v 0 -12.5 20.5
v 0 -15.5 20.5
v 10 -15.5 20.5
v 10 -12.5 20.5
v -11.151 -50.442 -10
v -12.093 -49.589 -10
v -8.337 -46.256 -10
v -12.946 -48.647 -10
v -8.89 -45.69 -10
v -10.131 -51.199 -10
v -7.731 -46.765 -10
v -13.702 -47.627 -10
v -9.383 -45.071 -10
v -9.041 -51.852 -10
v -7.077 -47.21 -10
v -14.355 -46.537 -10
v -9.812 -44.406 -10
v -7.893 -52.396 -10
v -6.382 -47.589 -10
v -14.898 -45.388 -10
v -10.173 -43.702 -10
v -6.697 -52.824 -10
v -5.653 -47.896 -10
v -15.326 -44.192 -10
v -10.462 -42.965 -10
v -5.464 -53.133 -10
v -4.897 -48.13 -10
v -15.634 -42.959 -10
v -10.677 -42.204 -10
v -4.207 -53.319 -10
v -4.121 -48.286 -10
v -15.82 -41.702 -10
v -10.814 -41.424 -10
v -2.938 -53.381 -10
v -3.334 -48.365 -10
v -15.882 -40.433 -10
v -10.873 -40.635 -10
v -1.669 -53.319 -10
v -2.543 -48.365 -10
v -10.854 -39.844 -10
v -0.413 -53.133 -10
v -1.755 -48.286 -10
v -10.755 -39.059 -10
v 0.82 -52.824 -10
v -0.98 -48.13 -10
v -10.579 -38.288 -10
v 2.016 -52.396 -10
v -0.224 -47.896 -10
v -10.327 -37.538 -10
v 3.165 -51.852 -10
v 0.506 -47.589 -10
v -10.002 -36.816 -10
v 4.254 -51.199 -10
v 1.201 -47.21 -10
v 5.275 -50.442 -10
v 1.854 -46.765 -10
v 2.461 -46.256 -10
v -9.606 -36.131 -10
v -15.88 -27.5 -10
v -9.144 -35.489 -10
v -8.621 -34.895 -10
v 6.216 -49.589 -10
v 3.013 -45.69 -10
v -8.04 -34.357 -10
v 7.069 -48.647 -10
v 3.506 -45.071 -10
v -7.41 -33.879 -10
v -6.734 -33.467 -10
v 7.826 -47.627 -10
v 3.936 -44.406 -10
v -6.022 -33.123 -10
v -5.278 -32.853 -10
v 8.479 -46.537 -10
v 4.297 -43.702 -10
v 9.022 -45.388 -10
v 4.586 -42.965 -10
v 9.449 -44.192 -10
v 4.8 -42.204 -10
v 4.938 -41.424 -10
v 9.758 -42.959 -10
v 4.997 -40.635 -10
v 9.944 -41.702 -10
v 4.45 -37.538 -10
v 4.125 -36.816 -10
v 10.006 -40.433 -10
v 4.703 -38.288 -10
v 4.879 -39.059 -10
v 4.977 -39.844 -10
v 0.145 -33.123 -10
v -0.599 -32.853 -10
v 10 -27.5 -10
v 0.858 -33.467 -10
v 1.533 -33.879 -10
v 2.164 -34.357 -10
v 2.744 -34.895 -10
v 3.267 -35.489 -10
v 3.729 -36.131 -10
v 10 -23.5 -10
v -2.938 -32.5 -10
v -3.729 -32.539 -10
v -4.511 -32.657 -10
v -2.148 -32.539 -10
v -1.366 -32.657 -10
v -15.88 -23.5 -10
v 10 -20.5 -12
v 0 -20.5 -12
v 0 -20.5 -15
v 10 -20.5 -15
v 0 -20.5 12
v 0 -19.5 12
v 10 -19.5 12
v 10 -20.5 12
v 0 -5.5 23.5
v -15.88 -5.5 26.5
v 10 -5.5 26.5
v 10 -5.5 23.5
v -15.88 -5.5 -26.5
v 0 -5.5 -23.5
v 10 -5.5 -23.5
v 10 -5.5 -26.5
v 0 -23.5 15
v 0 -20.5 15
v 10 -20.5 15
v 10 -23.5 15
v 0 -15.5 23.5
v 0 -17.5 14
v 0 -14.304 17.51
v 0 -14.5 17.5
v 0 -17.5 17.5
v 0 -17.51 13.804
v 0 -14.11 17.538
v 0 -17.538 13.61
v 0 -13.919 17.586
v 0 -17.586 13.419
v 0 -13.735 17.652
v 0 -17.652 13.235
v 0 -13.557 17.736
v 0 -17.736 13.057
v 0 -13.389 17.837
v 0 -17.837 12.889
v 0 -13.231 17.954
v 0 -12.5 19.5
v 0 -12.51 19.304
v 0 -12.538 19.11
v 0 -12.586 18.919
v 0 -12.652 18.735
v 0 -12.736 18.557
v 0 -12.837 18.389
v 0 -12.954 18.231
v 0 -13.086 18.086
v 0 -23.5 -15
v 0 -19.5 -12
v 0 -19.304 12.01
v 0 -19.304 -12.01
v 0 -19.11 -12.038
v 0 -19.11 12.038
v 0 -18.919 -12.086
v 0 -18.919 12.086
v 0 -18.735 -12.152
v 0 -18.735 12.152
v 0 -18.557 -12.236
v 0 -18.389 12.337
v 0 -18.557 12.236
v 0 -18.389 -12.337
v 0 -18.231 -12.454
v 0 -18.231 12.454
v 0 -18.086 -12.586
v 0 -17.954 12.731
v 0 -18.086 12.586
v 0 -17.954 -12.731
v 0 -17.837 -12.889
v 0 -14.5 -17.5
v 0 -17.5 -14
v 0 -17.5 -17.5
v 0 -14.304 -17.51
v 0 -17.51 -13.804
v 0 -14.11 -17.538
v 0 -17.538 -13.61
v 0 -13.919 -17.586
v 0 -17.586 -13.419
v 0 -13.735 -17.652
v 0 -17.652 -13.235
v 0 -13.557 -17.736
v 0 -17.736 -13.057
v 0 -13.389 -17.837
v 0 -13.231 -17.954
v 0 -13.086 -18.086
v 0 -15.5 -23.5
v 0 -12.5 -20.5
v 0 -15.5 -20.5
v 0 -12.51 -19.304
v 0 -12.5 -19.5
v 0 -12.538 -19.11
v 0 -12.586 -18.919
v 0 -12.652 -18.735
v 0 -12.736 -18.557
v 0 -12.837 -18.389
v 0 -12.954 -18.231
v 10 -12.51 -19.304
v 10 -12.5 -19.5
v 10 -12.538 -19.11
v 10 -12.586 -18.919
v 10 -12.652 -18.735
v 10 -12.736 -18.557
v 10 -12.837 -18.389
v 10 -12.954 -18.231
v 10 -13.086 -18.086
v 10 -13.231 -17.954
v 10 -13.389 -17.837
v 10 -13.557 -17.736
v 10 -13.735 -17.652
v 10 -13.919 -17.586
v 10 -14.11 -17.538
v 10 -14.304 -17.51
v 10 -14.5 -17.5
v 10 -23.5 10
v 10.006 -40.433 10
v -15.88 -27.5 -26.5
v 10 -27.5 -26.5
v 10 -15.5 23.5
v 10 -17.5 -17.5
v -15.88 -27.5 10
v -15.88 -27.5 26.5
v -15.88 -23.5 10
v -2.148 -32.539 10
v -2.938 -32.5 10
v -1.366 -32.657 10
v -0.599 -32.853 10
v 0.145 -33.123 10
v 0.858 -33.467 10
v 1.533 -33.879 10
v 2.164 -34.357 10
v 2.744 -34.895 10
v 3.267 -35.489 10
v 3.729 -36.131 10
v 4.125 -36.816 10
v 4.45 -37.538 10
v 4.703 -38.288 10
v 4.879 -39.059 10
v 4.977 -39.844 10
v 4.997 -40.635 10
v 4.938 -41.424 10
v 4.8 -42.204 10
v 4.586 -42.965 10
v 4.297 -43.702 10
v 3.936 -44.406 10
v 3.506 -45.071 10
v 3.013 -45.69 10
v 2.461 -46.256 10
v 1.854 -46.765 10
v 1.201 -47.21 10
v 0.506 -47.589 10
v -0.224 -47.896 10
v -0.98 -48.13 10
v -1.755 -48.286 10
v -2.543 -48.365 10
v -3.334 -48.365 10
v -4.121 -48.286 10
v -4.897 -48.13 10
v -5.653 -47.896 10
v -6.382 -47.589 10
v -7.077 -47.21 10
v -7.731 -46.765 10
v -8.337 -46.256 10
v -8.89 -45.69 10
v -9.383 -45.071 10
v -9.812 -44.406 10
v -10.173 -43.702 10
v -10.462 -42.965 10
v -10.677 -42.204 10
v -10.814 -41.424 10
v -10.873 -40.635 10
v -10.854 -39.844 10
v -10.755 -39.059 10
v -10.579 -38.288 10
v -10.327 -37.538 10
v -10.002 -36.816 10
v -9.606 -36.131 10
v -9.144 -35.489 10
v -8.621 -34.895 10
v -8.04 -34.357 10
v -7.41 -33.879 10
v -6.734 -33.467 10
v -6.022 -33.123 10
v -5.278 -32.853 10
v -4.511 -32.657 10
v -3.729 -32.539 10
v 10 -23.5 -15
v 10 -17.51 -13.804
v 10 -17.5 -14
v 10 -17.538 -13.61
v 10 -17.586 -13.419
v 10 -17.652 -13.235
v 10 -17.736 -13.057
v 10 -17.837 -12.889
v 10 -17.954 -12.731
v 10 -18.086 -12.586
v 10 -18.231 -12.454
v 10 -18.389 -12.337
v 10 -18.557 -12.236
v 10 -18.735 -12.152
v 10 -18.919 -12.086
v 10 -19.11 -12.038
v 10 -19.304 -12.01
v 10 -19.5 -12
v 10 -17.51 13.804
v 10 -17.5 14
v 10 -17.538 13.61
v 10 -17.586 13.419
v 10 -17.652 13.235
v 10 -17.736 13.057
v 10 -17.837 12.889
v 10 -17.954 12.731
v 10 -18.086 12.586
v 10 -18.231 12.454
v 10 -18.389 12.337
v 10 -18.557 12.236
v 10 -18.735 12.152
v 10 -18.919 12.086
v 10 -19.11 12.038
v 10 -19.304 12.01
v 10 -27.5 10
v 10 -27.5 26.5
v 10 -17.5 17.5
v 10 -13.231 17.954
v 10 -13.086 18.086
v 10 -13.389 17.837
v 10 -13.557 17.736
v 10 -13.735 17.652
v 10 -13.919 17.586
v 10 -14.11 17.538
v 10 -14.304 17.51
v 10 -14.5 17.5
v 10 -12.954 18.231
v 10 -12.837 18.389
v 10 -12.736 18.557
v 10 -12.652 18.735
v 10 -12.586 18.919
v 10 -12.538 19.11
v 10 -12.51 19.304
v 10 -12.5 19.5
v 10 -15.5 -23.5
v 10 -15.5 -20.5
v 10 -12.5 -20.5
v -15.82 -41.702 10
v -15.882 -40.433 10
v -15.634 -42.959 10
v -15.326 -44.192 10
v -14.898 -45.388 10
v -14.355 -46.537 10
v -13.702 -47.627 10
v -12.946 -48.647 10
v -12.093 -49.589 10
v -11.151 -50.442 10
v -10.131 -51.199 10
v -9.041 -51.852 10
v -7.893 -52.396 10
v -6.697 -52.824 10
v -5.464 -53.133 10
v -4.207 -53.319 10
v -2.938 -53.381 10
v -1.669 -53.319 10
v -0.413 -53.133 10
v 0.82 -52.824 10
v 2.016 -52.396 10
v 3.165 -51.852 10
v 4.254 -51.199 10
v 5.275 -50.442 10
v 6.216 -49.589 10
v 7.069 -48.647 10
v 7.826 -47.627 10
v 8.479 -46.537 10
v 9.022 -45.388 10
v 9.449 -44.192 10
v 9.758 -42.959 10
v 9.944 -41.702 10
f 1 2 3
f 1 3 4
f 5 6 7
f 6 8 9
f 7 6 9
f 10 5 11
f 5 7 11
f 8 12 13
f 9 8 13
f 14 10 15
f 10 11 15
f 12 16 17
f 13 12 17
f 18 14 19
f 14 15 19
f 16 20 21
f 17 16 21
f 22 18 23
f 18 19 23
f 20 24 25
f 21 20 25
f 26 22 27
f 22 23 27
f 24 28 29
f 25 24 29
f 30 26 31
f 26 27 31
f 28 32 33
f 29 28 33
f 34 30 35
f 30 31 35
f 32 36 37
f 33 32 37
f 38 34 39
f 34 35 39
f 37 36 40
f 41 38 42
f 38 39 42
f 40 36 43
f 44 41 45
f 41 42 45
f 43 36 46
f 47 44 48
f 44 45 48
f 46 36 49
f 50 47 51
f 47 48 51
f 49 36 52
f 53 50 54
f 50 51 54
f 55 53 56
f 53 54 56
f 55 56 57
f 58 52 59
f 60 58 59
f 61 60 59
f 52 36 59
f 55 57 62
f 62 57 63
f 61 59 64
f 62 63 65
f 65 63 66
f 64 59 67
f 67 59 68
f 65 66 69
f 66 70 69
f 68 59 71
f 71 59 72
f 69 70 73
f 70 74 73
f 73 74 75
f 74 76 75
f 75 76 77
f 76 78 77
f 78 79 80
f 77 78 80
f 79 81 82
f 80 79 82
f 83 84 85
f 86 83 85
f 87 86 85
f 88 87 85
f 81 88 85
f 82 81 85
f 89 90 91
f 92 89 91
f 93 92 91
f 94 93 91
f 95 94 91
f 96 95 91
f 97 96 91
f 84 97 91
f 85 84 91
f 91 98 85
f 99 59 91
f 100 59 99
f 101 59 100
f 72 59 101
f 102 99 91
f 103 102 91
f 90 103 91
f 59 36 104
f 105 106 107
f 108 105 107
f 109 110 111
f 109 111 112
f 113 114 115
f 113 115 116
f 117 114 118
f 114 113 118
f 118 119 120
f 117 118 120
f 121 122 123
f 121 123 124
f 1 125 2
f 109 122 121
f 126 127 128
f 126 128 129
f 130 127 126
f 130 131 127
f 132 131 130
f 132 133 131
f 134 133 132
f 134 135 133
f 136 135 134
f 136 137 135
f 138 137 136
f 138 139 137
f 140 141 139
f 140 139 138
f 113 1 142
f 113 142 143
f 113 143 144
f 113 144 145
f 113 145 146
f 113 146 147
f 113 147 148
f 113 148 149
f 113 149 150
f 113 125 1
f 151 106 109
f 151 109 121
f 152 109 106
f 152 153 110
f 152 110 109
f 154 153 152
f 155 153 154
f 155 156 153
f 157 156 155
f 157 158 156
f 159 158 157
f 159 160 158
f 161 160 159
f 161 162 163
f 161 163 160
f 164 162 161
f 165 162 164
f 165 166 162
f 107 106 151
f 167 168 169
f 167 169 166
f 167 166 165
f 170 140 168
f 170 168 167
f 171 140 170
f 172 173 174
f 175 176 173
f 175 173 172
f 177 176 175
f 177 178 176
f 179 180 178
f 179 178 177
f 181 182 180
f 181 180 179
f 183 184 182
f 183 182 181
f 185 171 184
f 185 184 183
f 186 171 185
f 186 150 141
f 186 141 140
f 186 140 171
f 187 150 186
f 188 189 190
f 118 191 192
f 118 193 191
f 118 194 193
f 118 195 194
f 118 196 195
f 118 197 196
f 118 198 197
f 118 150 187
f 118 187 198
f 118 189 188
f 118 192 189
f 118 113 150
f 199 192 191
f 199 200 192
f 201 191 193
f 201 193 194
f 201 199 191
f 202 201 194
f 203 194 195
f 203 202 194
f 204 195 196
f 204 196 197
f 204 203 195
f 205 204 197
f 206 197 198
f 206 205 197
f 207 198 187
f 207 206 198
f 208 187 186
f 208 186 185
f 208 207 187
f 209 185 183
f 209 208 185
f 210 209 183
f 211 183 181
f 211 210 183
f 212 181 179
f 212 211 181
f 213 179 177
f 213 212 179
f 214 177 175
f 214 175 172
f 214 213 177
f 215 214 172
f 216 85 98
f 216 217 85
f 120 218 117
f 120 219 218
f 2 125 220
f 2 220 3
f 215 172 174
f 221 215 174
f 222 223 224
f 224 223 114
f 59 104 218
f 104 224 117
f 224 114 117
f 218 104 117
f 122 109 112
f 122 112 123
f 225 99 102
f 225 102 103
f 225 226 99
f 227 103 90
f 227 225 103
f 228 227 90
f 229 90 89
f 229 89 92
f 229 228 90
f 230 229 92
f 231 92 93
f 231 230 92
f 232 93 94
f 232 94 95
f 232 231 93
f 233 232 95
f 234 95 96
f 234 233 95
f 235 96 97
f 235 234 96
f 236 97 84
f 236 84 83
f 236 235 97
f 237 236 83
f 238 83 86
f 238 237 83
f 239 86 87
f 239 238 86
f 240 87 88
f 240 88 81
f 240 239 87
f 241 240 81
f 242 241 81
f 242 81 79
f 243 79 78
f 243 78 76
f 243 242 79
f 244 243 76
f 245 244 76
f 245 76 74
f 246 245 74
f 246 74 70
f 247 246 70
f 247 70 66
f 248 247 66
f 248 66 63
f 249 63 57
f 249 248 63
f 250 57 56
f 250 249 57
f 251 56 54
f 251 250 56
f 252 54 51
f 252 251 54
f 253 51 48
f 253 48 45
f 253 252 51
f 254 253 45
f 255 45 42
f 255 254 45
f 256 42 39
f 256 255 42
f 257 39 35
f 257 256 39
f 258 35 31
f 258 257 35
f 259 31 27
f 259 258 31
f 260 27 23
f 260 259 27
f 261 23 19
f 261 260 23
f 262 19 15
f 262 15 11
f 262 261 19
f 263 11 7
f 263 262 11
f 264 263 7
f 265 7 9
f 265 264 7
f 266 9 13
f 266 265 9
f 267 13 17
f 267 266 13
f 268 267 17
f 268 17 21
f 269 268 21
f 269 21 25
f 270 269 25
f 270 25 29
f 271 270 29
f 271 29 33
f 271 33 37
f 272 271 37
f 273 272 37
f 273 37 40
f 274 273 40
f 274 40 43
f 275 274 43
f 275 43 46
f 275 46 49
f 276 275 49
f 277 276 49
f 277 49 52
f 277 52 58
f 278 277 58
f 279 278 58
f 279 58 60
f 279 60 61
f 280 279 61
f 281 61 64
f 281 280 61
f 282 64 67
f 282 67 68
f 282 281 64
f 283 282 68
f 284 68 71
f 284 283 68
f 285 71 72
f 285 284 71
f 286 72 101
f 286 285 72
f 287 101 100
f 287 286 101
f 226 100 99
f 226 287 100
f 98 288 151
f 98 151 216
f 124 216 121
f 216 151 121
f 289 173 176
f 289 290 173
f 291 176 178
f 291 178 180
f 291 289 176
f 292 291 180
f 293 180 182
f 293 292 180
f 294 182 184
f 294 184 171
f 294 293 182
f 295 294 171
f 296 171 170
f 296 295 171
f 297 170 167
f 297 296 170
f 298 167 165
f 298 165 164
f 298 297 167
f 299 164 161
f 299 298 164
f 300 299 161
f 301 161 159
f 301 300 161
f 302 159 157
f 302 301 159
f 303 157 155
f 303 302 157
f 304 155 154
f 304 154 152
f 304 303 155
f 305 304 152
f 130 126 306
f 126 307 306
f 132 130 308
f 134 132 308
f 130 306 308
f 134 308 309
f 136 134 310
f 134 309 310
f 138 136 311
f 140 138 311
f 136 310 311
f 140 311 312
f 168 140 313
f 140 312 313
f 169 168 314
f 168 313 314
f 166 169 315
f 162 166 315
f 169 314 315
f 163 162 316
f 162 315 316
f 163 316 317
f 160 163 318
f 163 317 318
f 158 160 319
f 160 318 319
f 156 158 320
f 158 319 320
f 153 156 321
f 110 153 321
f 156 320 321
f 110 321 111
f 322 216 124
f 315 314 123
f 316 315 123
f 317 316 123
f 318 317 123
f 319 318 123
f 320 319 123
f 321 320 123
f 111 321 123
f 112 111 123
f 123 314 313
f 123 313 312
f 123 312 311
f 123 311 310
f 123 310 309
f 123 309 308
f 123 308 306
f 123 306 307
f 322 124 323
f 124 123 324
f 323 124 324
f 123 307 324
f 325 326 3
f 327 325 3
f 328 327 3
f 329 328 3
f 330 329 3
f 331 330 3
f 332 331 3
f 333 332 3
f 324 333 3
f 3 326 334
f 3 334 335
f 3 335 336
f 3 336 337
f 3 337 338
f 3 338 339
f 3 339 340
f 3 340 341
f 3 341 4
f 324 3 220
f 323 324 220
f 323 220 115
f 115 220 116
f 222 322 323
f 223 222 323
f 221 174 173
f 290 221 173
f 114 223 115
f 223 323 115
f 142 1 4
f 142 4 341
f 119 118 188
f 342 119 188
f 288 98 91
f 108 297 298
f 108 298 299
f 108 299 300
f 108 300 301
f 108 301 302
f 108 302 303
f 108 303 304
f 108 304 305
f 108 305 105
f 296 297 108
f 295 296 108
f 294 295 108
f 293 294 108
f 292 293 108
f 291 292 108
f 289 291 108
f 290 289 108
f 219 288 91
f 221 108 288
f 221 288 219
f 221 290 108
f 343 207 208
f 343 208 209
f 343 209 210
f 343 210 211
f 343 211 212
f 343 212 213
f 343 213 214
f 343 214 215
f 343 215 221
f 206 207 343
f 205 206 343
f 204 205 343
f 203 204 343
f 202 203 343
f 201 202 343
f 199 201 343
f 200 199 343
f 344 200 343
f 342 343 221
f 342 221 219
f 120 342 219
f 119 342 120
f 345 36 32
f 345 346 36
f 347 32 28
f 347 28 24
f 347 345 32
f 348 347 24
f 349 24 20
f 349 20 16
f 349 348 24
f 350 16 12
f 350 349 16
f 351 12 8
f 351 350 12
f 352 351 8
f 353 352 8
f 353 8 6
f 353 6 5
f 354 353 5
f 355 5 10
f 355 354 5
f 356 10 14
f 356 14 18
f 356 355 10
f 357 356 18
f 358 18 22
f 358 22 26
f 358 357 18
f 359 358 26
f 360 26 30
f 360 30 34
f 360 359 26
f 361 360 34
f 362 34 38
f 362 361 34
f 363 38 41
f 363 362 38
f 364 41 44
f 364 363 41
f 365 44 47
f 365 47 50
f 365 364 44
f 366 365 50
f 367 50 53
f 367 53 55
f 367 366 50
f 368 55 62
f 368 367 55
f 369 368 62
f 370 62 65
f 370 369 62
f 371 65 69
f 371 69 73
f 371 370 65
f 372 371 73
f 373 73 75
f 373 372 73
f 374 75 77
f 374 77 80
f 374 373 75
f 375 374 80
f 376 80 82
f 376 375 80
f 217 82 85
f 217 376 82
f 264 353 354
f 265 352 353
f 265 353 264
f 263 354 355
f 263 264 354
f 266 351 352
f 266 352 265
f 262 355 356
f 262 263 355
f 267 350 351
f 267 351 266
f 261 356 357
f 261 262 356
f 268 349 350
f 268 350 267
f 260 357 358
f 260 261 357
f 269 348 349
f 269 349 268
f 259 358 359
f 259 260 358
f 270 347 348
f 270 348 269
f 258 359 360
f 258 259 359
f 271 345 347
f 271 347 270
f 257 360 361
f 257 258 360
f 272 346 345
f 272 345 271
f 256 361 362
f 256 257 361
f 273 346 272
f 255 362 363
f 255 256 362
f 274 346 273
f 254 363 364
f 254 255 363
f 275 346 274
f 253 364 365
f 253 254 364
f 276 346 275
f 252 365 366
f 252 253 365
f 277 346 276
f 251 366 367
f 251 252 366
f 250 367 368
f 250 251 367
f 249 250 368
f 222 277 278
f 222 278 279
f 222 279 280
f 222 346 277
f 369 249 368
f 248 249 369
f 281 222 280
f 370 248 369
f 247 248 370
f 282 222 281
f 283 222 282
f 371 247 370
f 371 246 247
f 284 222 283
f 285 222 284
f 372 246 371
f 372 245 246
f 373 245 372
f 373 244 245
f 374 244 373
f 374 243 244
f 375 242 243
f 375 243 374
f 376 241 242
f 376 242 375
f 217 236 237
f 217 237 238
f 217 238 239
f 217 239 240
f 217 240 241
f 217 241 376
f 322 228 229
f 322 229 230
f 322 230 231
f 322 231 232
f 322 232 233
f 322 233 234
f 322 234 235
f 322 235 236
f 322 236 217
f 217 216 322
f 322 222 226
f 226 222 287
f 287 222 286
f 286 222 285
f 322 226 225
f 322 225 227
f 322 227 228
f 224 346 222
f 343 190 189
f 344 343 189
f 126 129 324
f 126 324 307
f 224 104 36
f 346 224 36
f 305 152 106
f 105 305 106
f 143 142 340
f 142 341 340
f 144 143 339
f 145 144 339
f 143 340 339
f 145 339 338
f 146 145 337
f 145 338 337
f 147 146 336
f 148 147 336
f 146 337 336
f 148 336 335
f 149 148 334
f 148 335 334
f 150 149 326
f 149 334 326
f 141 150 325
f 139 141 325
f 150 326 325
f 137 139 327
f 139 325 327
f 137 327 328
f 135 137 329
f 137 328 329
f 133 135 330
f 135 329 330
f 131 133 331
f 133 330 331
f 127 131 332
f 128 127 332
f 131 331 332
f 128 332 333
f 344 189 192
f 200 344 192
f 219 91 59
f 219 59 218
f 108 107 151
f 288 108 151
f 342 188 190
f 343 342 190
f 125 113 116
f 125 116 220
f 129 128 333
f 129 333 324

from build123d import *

# Parameters (mm, degrees)
BOSS_EXTRUDE1_DEPTH = 10
FILLET1_R           = 2
SKETCH2_W           = 26.5
SKETCH2_H           = 22
BOSS_EXTRUDE2_DEPTH = 15.88
SKETCH3_R           = 7.9375
BOSS_EXTRUDE3_DEPTH = 10


with BuildPart() as part:
    # Sketch1 → Boss-Extrude1 (new body)
    with BuildSketch(Plane(origin=(0, 0, 0), x_dir=(0, 0, -1), z_dir=(1, 0, 0))):
        Polygon((-26.5, -27.5), (-26.5, -5.5), (-23.5, -5.5), (-23.5, -15.5), (-20.5, -15.5), (-20.5, -12.5), (-17.5, -12.5), (-17.5, -17.5), (-12, -17.5), (-12, -20.5), (-15, -20.5), (-15, -23.5), (0, -23.5), (0, -27.5), align=None)
    extrude(amount=BOSS_EXTRUDE1_DEPTH)

    # Fillet1
    fillet1_edges = [part.edges().sort_by_distance(p)[0] for p in [
        (5, -12.5, 17.5),
        (5, -17.5, 12),
    ]]
    fillet(fillet1_edges, radius=FILLET1_R)

    # Sketch2 → Boss-Extrude2 (add)
    with BuildSketch(Plane.ZY):
        with Locations((13.25, -16.5)):
            Rectangle(SKETCH2_W, SKETCH2_H)
    extrude(amount=BOSS_EXTRUDE2_DEPTH)

    # Sketch3 → Boss-Extrude3 (add)
    with BuildSketch(Plane(origin=(0, 0, 0), x_dir=(-1, 0, 0), z_dir=(0, 0, -1))):
        with BuildLine():
            Line((-10.00567497, -40.433161955), (-10, -23.5))
            Line((-10, -23.5), (15.88, -23.5))
            Line((15.88, -23.5), (15.882323576, -40.433162744))
            ThreePointArc((15.882323576, -40.433162744), (2.938323909, -53.3815), (-10.00567497, -40.433161955))
        make_face()
        with Locations(Location((2.938324303, -40.4375, 0), (0, 0, 90))):
            Circle(SKETCH3_R, mode=Mode.SUBTRACT)
    extrude(amount=-BOSS_EXTRUDE3_DEPTH)

    # Mirror1: part across plane


with BuildPart() as part_1:
    add(part.part)
    add(part.part.mirror(Plane(origin=(10, -23.5, 0), x_dir=(1, 0, 0), z_dir=(0, 0, 1))))


solid = part_1.part
